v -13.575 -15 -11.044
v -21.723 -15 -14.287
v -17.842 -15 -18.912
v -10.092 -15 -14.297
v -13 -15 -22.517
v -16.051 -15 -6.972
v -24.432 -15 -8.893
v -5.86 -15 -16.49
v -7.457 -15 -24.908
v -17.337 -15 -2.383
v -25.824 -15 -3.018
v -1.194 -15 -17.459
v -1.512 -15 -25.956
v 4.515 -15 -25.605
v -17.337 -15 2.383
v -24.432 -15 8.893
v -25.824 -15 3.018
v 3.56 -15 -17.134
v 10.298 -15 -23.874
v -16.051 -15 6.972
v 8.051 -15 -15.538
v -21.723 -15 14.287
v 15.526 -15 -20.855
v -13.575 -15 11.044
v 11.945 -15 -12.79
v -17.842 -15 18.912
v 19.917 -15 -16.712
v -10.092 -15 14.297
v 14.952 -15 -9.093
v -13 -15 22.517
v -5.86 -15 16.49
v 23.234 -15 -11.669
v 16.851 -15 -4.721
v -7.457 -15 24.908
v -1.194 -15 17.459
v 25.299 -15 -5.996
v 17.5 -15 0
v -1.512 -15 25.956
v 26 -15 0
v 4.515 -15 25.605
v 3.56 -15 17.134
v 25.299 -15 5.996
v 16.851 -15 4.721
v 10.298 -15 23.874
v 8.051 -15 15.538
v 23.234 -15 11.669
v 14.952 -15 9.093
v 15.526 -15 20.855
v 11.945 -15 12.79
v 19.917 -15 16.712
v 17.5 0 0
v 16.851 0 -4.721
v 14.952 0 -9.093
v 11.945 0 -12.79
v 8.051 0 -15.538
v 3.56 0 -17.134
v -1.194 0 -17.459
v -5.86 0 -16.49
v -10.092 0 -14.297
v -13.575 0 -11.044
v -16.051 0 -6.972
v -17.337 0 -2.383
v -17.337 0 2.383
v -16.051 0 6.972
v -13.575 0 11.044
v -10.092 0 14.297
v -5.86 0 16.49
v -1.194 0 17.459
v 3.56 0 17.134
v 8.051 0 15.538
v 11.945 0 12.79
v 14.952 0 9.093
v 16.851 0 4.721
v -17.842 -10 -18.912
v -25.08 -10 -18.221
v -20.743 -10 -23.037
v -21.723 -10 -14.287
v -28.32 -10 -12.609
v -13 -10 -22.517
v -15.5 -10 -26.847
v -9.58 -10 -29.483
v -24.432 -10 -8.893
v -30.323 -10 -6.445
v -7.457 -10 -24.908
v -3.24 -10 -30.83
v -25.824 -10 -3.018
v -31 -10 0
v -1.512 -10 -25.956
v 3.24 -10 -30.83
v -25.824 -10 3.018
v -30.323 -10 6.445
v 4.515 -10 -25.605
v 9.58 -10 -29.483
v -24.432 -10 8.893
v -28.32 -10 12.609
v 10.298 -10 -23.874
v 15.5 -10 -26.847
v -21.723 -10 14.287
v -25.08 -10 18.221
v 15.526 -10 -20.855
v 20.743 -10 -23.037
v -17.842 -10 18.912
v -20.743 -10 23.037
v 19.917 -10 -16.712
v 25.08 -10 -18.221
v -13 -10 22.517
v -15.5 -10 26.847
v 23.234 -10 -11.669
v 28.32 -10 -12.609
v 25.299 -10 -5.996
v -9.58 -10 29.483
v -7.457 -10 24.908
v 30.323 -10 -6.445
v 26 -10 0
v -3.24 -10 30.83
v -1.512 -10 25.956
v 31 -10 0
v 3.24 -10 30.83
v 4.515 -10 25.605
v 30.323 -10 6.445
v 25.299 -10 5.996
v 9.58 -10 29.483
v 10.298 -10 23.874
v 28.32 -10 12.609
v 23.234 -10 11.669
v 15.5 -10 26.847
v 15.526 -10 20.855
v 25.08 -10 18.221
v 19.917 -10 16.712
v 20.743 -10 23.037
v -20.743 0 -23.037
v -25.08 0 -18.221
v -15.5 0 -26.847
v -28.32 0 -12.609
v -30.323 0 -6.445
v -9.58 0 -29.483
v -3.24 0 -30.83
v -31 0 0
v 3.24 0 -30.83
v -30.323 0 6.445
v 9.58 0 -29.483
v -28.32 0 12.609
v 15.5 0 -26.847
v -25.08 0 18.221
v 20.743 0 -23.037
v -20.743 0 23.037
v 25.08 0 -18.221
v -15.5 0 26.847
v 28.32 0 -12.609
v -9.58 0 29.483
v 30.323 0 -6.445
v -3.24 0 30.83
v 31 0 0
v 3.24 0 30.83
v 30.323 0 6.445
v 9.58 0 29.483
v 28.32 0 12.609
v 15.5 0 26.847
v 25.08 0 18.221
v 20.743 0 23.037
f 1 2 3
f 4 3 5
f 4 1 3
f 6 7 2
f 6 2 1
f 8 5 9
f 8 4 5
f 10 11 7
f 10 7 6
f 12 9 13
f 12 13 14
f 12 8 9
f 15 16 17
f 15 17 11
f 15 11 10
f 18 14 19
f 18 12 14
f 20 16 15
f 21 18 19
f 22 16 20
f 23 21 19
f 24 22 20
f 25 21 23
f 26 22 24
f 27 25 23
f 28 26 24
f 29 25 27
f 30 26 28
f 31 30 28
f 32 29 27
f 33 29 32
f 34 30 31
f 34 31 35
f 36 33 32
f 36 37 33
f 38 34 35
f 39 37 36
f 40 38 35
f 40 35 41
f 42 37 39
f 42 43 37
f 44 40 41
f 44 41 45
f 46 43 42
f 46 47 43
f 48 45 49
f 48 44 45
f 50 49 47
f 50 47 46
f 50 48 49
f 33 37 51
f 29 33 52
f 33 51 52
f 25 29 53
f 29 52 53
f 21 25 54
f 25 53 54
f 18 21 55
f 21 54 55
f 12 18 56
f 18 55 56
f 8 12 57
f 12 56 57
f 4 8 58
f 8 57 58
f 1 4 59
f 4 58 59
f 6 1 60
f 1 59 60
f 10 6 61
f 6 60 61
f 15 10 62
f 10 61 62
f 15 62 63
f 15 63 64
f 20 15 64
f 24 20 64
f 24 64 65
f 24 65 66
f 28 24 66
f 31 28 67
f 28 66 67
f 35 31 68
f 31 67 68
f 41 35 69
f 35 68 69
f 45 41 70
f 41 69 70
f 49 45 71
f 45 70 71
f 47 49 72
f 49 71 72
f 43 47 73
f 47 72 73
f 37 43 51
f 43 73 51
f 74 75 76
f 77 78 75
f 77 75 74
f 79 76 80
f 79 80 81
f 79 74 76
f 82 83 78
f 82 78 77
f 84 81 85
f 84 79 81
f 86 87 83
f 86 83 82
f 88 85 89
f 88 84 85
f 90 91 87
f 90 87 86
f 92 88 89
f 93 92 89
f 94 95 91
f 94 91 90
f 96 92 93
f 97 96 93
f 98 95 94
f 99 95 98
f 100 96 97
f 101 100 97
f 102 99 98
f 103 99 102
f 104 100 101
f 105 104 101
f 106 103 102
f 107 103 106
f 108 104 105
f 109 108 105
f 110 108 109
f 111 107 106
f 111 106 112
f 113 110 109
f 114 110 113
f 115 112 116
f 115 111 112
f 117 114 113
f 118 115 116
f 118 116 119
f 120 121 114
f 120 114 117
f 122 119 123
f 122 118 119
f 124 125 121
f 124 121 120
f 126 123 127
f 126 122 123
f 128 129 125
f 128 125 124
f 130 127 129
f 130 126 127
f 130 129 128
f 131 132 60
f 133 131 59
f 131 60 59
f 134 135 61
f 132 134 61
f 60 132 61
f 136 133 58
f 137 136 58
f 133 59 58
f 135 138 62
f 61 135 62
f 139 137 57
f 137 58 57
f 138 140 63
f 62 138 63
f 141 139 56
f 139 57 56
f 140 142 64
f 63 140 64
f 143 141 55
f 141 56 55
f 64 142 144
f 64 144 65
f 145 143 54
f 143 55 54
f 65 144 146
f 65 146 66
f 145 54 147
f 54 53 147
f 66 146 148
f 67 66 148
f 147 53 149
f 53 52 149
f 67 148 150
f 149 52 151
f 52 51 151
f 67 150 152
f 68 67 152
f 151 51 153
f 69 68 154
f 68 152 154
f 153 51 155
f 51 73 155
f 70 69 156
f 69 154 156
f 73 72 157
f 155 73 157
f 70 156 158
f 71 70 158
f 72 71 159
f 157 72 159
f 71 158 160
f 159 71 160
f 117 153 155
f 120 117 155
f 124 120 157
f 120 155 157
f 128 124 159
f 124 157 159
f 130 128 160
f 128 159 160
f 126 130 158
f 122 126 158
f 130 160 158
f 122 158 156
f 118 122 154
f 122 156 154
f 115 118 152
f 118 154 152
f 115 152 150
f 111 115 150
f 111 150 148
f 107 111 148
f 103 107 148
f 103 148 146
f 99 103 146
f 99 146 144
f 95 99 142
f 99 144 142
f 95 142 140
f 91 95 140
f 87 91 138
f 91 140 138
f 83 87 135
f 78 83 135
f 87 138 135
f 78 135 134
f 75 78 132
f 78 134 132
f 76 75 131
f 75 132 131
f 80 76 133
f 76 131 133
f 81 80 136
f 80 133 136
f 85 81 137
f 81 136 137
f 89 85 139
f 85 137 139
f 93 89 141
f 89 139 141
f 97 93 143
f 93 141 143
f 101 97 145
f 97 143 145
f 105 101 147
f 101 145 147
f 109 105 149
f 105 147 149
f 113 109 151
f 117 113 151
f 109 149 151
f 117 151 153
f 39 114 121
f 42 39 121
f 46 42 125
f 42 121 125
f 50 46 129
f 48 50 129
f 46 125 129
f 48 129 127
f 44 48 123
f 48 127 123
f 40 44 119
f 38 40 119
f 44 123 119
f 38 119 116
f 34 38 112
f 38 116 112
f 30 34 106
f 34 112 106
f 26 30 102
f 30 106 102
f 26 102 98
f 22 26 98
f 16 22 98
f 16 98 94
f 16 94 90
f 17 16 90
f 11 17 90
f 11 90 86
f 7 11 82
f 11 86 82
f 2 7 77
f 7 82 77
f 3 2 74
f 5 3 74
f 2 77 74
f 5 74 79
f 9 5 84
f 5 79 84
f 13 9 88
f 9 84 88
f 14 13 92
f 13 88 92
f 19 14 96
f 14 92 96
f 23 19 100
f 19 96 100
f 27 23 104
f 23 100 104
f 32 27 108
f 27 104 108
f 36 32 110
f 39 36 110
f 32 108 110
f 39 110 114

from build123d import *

# Parameters (mm, degrees)
F0_R      = 31
F0_R_2    = 17.5
F1_DEPTH  = 10
F2_R      = 26
F3_DEPTH  = 5
F3_FACE_R = 17.5
F4_DEPTH  = 25.4


with BuildPart() as f1:
    # F0 (on Front) → F1 (new body)
    with BuildSketch(Plane.XZ):
        Circle(F0_R)
        Circle(F0_R_2, mode=Mode.SUBTRACT)
    extrude(amount=F1_DEPTH)

    # F2 (on face) → F3 (join)
    with BuildSketch(Plane.XZ.offset(10)):
        Circle(F2_R)
    extrude(amount=F3_DEPTH)

    # F3_face (on face) → F4 (cut)
    with BuildSketch(Plane(origin=(0, -10, 0), x_dir=(1, 0, 0), z_dir=(0, 1, 0))):
        Circle(F3_FACE_R)
    extrude(amount=-F4_DEPTH, mode=Mode.SUBTRACT)


solid = f1.part
